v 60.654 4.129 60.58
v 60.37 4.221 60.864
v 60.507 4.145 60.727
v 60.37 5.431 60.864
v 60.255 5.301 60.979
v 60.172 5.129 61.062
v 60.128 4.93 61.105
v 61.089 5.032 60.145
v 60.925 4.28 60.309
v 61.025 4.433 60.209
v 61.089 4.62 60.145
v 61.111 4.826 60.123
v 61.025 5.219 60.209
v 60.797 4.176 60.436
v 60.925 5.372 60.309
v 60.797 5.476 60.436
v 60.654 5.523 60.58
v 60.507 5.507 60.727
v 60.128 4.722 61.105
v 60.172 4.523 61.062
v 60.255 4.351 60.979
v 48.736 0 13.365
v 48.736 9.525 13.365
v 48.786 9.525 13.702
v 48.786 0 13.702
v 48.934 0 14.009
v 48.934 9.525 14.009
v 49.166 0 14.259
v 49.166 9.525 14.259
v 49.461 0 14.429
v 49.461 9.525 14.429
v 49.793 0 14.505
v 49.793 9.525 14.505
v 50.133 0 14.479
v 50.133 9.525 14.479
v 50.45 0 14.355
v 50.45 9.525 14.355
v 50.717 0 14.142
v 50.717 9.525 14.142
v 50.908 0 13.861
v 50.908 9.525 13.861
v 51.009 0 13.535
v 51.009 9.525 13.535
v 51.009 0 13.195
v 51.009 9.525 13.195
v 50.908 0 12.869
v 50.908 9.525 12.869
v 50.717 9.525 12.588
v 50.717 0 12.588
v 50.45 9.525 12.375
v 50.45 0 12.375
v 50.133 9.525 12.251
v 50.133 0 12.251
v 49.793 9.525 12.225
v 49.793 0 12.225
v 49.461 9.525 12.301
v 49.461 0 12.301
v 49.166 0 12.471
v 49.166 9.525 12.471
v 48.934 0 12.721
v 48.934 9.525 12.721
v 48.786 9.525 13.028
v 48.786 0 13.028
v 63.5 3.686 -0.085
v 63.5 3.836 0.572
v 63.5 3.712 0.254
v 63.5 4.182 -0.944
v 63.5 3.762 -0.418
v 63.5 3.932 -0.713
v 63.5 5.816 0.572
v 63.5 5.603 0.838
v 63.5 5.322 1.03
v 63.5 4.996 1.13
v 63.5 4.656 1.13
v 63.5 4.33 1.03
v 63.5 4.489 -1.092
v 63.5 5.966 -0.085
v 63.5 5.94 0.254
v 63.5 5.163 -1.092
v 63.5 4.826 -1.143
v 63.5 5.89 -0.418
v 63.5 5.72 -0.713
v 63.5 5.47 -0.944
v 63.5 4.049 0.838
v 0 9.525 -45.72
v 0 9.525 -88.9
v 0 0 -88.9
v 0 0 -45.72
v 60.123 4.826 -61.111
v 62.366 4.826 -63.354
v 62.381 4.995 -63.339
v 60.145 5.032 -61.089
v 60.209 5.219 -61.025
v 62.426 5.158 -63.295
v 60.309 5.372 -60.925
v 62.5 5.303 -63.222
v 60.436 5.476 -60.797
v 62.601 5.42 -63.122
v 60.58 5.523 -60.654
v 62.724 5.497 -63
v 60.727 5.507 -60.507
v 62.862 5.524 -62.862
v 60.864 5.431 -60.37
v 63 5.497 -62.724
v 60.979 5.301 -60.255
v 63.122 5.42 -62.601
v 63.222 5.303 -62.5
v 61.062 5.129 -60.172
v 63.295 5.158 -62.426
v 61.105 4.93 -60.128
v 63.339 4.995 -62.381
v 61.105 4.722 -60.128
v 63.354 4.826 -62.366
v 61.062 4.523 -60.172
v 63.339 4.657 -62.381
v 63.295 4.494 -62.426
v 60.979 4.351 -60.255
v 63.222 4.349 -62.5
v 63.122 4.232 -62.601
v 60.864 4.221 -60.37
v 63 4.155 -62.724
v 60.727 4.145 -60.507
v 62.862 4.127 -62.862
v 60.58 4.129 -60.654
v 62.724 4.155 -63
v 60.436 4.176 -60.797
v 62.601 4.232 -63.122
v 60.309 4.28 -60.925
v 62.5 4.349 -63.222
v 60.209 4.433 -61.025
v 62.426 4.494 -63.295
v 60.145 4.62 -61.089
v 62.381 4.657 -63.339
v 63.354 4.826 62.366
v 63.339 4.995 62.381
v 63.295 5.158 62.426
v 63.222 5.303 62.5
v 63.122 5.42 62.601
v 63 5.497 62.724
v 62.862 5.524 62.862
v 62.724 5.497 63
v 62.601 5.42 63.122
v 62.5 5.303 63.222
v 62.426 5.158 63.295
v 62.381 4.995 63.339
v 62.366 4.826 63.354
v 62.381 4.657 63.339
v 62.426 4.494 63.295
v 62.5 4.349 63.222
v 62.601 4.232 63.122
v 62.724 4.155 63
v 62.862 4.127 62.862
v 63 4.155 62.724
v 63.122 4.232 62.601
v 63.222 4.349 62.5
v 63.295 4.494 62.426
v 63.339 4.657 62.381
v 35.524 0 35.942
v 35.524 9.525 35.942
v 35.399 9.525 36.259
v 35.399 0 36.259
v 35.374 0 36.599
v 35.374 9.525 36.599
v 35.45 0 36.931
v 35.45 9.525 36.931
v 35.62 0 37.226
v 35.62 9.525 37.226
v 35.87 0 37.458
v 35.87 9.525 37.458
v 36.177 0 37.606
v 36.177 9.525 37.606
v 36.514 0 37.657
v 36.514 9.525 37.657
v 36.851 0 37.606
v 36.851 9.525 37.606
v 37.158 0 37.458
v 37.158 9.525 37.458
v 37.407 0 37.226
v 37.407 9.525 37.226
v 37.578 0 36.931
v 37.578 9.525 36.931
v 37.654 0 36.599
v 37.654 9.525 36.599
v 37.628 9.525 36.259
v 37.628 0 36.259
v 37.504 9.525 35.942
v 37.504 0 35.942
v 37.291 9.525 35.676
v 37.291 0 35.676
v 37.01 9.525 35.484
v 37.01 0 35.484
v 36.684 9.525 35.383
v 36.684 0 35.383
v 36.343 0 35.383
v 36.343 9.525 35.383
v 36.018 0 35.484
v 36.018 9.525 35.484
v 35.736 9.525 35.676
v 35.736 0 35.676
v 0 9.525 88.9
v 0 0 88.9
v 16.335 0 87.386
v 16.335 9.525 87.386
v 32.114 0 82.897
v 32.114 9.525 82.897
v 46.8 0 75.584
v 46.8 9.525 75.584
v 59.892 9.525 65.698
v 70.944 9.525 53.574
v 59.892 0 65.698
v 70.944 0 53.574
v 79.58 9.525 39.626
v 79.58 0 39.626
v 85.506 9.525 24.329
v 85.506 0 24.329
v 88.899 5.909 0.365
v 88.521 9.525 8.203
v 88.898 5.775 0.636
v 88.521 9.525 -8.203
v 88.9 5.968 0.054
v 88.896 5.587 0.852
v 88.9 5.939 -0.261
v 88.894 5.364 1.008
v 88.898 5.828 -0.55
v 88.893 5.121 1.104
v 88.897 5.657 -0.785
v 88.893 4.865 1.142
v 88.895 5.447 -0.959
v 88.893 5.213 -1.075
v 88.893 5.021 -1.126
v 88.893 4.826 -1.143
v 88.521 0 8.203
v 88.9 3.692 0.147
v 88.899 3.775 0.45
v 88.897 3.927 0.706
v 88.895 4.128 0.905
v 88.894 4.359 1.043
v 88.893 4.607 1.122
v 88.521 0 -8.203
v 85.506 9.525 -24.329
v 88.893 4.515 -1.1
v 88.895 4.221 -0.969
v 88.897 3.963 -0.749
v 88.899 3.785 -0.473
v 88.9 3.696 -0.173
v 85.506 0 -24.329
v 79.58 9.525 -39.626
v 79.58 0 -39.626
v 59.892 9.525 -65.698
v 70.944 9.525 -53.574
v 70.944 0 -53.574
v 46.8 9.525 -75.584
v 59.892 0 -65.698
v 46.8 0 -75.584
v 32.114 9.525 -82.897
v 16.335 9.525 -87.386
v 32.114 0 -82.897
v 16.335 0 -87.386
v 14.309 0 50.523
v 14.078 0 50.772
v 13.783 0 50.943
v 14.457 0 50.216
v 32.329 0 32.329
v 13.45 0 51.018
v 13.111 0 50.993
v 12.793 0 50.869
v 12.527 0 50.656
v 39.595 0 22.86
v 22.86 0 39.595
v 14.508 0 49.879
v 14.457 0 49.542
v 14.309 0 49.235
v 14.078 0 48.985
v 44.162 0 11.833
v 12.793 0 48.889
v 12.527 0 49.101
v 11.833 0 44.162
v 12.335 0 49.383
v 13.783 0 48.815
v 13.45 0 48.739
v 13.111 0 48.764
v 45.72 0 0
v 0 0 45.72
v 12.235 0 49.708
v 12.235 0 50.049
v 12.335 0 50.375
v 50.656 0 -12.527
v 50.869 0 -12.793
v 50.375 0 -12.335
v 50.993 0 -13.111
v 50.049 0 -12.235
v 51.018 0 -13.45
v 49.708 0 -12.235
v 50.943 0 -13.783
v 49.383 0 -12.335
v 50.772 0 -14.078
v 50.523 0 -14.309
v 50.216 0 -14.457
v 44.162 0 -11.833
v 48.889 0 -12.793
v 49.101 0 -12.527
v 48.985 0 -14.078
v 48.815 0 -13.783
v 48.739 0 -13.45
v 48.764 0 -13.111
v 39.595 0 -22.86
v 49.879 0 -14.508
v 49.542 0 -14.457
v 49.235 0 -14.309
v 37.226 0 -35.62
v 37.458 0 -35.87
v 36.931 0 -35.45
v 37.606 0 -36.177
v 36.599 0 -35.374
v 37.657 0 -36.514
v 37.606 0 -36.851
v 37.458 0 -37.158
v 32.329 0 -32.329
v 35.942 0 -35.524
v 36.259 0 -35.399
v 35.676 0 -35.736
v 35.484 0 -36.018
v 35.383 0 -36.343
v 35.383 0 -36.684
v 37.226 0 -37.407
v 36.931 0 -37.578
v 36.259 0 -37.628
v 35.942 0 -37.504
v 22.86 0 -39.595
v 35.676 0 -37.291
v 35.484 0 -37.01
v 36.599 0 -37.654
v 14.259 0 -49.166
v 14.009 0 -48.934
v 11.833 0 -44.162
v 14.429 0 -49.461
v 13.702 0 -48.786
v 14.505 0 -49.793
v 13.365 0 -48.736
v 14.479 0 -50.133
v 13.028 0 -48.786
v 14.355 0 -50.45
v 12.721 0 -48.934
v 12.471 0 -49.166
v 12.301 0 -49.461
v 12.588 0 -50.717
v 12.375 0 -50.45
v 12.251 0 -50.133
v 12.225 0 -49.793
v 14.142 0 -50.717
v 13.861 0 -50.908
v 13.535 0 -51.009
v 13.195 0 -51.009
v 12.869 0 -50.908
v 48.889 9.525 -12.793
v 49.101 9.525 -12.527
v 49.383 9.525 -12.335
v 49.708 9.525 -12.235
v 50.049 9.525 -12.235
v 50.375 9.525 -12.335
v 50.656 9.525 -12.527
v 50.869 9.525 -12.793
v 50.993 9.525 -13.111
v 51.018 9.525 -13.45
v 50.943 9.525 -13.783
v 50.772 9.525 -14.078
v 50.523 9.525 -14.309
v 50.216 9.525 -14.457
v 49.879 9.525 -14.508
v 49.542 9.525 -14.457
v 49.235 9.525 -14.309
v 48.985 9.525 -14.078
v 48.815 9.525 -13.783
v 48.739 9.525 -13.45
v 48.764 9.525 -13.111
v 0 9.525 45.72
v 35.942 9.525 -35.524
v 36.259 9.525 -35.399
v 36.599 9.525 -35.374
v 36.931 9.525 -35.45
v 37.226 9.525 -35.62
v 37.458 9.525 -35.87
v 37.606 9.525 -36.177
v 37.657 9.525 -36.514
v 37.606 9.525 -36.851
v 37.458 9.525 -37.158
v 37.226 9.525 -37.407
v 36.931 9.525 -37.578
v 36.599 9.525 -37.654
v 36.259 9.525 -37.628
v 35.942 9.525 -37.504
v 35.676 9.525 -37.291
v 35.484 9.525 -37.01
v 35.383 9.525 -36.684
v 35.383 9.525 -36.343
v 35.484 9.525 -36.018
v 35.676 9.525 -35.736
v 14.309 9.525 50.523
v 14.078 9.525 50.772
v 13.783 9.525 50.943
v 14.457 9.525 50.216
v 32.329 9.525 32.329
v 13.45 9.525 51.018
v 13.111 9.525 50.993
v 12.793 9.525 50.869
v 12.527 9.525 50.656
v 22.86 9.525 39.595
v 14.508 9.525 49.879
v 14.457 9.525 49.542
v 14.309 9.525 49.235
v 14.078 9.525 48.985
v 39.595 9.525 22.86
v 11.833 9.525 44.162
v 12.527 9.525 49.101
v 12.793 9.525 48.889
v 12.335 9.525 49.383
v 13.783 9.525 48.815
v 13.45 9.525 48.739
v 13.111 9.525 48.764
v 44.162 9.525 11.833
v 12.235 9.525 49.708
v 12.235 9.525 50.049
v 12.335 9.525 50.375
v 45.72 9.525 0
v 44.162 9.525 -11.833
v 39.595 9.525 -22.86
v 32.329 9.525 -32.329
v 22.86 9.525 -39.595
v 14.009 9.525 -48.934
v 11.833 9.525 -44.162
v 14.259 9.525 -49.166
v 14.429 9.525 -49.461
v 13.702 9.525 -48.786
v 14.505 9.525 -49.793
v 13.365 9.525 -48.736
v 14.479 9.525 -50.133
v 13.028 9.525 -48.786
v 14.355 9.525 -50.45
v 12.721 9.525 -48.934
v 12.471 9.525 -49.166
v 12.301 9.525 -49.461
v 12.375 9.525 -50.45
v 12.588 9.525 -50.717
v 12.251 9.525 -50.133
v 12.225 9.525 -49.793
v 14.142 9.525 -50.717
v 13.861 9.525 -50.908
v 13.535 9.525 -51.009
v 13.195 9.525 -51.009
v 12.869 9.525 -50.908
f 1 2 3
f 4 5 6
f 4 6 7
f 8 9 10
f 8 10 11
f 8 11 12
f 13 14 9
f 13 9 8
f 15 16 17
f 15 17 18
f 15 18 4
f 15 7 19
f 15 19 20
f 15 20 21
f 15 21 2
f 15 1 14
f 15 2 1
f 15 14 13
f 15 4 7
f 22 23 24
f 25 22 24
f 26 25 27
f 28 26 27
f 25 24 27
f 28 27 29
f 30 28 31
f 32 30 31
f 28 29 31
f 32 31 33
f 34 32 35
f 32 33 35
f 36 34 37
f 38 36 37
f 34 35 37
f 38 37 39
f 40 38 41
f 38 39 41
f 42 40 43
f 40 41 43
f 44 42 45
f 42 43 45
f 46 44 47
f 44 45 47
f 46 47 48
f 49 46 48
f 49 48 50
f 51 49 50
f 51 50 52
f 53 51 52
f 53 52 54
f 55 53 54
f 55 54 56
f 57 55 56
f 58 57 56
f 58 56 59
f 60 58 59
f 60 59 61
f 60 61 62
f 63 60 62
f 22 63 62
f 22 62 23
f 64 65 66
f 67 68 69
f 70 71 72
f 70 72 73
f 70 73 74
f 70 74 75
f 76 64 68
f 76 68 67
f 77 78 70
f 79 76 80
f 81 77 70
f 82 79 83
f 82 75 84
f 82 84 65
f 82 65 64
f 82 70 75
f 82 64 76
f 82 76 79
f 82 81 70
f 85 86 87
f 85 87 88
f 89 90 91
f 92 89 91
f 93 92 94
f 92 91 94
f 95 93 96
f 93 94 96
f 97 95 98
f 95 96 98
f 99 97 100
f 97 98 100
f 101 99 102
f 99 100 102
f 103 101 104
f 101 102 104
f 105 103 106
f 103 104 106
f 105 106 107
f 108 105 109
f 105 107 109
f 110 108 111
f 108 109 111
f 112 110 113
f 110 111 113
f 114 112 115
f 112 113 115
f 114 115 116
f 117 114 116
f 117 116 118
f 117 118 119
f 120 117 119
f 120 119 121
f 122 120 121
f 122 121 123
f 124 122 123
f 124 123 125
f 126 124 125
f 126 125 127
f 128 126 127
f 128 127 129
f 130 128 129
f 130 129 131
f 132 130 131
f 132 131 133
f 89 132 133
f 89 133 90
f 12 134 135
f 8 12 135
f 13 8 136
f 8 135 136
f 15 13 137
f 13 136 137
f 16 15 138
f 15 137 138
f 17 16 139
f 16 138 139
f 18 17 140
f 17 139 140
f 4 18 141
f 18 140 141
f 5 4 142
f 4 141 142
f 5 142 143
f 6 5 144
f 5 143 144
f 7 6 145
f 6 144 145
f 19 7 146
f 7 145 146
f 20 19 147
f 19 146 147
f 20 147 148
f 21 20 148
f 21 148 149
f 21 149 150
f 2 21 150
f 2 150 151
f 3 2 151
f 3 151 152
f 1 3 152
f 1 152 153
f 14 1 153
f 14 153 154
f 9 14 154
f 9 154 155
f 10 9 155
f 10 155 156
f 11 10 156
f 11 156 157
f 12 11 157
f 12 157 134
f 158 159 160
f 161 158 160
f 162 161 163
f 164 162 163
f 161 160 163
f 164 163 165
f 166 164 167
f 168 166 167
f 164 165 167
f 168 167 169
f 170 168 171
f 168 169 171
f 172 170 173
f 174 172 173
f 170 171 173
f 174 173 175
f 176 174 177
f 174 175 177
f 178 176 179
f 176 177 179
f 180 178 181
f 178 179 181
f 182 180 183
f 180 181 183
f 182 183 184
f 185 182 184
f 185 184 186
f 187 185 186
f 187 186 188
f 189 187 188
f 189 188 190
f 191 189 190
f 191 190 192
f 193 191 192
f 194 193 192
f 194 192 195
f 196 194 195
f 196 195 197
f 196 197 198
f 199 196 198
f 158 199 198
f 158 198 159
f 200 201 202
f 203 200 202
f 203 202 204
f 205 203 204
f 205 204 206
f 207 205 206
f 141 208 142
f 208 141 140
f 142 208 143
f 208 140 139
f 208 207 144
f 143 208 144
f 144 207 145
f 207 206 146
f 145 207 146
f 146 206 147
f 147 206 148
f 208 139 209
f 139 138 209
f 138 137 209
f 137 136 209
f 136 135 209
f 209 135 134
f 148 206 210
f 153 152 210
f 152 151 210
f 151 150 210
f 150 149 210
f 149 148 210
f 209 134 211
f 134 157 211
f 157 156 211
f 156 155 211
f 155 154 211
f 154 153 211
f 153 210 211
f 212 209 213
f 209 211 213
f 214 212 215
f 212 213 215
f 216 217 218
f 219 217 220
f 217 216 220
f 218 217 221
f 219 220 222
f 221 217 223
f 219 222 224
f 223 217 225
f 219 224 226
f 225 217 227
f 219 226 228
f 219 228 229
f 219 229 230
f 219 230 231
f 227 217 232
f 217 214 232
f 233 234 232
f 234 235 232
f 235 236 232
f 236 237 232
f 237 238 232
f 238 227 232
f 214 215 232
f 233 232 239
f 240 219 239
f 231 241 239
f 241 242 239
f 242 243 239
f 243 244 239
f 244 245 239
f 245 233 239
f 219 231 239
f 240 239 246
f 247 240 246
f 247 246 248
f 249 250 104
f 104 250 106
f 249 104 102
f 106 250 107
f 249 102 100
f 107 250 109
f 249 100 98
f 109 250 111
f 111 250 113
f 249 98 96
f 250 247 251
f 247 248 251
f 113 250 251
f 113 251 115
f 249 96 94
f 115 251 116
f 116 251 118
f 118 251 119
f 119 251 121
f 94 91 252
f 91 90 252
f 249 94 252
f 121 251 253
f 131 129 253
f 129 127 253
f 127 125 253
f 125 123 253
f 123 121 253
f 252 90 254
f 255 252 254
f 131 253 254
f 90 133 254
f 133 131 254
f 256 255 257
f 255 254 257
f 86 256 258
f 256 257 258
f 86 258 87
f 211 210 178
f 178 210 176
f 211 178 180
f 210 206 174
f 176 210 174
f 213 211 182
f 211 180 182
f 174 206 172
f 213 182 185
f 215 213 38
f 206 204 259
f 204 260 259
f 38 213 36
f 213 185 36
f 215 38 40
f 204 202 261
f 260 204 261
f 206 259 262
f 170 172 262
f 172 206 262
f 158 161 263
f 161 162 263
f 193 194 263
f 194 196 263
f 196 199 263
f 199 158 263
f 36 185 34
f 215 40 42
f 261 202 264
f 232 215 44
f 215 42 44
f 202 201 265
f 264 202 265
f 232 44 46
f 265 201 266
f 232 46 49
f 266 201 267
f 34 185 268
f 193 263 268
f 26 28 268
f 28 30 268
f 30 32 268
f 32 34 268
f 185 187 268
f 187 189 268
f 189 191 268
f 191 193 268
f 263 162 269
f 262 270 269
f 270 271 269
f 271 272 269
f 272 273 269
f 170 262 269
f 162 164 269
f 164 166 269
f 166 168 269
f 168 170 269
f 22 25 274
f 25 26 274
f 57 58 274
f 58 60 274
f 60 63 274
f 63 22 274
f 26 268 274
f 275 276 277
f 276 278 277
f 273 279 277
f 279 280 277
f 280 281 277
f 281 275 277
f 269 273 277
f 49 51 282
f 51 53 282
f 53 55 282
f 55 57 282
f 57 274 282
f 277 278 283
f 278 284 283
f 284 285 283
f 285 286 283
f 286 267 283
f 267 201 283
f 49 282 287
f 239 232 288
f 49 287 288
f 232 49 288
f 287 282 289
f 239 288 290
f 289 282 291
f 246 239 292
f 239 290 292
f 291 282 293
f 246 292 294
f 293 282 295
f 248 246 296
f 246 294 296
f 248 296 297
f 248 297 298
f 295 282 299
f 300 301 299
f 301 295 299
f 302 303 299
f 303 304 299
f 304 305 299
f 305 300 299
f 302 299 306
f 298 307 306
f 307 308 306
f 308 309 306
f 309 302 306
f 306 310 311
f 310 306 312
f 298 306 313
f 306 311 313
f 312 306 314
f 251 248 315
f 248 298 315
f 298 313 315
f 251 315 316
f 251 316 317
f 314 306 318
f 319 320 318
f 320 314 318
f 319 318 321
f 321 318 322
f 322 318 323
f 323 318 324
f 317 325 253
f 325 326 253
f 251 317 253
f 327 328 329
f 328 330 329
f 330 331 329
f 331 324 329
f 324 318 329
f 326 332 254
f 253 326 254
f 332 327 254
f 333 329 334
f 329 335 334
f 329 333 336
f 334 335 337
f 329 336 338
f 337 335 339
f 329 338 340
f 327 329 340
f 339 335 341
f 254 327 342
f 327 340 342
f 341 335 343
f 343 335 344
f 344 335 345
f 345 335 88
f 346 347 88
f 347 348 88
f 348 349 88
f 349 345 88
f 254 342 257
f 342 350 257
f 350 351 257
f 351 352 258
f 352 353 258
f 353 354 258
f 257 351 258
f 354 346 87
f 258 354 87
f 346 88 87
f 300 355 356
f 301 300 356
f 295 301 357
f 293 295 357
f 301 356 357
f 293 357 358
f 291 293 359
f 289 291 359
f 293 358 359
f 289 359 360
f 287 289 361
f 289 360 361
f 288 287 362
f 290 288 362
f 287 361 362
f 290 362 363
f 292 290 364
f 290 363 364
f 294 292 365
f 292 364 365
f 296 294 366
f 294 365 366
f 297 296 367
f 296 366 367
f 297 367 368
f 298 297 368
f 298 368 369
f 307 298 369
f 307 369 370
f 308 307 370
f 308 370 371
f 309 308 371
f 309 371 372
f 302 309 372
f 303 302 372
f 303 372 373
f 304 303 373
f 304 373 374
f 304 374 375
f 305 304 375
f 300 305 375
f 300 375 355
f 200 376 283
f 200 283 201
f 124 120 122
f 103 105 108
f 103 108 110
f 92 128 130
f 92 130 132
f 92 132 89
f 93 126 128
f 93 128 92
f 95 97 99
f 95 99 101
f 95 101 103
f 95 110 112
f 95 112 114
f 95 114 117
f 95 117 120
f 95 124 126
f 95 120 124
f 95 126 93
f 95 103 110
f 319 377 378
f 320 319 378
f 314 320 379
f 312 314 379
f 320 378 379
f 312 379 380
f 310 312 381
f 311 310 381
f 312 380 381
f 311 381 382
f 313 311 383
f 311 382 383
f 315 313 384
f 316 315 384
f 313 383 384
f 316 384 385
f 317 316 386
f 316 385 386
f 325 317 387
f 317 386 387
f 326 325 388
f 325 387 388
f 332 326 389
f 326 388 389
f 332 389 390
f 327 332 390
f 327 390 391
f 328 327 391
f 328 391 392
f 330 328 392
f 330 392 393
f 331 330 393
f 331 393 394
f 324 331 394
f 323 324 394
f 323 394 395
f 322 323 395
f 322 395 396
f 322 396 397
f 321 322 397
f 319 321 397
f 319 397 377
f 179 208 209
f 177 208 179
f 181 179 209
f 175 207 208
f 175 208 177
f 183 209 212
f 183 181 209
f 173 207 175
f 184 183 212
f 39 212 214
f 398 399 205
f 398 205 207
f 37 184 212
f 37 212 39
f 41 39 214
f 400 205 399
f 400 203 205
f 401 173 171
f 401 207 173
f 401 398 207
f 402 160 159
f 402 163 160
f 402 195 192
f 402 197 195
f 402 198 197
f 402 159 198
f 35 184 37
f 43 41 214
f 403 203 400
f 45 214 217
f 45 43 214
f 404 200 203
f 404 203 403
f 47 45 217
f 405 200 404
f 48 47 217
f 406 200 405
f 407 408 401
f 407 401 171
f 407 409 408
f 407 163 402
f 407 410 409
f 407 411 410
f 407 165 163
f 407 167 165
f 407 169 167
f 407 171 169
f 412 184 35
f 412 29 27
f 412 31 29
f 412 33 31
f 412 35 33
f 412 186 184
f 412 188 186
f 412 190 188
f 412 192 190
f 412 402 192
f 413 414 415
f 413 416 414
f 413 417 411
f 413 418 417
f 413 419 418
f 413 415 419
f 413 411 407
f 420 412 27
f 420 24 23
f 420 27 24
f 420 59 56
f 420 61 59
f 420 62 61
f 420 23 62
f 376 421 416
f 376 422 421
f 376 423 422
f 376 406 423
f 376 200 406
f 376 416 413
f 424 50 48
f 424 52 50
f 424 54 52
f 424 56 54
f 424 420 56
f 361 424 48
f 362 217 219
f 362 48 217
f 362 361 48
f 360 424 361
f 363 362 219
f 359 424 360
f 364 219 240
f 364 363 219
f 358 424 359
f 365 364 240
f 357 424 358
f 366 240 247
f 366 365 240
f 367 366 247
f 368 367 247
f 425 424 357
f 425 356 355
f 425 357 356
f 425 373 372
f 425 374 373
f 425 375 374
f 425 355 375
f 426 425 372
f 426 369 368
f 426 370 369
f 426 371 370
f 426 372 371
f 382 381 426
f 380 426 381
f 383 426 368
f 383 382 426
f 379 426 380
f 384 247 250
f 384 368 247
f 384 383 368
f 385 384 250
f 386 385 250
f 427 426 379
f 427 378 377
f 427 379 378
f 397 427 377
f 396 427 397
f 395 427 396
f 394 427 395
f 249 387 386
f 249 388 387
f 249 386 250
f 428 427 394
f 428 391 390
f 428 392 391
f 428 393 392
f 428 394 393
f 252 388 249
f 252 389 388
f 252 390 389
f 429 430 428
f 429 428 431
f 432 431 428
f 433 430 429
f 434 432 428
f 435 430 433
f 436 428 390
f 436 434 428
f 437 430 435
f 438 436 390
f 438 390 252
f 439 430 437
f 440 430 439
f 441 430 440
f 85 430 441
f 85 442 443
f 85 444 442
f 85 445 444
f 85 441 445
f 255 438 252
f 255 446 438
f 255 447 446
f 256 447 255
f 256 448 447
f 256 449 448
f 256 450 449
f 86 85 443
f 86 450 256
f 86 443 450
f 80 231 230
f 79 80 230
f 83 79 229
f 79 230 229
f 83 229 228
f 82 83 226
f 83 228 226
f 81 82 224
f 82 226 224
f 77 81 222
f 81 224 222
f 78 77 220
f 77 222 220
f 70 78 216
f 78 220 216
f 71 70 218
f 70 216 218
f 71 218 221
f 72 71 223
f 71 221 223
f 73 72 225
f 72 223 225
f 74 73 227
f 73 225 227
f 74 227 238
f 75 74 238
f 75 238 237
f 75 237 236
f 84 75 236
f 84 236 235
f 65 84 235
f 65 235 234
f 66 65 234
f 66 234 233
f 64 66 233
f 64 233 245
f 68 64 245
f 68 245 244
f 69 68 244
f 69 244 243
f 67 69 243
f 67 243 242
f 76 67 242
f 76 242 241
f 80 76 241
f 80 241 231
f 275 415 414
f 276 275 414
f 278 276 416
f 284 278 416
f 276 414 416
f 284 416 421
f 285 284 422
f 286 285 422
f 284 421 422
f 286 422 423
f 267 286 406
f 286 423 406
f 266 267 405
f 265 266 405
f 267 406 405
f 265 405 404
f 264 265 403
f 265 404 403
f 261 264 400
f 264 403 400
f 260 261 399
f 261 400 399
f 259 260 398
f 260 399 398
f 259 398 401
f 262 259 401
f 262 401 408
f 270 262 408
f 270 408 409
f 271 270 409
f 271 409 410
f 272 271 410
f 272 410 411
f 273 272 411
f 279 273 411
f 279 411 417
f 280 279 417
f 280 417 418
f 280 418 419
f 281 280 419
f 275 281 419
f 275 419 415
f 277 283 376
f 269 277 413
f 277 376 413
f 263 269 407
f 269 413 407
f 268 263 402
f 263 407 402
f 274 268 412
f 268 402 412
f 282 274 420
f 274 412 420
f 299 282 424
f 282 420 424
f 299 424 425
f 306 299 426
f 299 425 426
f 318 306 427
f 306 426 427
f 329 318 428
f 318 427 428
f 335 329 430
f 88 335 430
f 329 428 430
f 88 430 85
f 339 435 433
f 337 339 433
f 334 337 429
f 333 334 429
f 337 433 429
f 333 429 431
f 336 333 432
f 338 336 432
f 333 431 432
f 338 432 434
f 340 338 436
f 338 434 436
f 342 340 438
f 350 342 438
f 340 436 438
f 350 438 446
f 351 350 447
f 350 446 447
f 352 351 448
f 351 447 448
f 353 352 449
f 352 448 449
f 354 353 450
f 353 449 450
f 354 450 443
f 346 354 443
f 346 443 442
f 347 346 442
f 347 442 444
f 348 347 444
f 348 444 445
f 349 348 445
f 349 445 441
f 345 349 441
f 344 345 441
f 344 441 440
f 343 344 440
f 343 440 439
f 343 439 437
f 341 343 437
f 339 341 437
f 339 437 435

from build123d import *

# Parameters (mm, degrees)
SKETCH1_R               = 88.9
BOSS_EXTRUDE1_DEPTH     = 9.525
SKETCH2_R               = 45.72
CUT_EXTRUDE1_DEPTH      = 12.7
SKETCH3_R               = 1.143
CUT_EXTRUDE2_DEPTH      = 12.7
CUT_EXTRUDE3_DEPTH      = 127.083883288
CUT_EXTRUDE3_DEPTH_BACK = 127.083883288
CIRPATTERN1_COUNT       = 12
SKETCH6_R               = 1.143
CUT_EXTRUDE4_DEPTH      = 25.4
SKETCH7_R               = 0.6985
CUT_EXTRUDE5_DEPTH      = 3.175
CIRPATTERN2_COUNT       = 4


with BuildPart() as part:
    # Sketch1 → Boss-Extrude1 (new body)
    with BuildSketch(Plane(origin=(0, 0, 0), x_dir=(1, 0, 0), z_dir=(0, 1, 0))):
        with Locations(Location((0, 0, 0), (0, 0, 90))):
            Circle(SKETCH1_R)
    extrude(amount=BOSS_EXTRUDE1_DEPTH)

    # Sketch2 → Cut-Extrude1 (cut)
    with BuildSketch(Plane(origin=(0, 9.525, 0), x_dir=(1, 0, 0), z_dir=(0, 1, 0))):
        with Locations(Location((0, 0, 0), (0, 0, 270))):
            Circle(SKETCH2_R)
    extrude(amount=-CUT_EXTRUDE1_DEPTH, mode=Mode.SUBTRACT)

    # Sketch3 → Cut-Extrude2 (cut)
    with BuildSketch(Plane(origin=(0, 9.525, 0), x_dir=(1, 0, 0), z_dir=(0, 1, 0))):
        with Locations(Location((13.364949615, 49.878671003, 0), (0, 0, 270))):
            Circle(SKETCH3_R)
    cut_extrude2 = extrude(amount=-CUT_EXTRUDE2_DEPTH, mode=Mode.SUBTRACT)

    # Sketch5 → Cut-Extrude3 (cut, two sides)
    with BuildSketch(Plane(origin=(0, 9.525, 0), x_dir=(1, 0, 0), z_dir=(0, 1, 0))) as cut_extrude3_sk:
        Polygon((0, 139.125590331), (0, -130.538836117), (-200.055019192, 4.293377107), align=None)
    extrude(amount=CUT_EXTRUDE3_DEPTH, mode=Mode.SUBTRACT)
    extrude(cut_extrude3_sk.sketch, amount=-CUT_EXTRUDE3_DEPTH_BACK, mode=Mode.SUBTRACT)

    # CirPattern1: Cut-Extrude2 ×12 about axis
    cirpattern1_axis = Axis((0, 9.525, 0), (0, 1, 0))
    for i in range(1, CIRPATTERN1_COUNT):
        add(cut_extrude2.rotate(cirpattern1_axis, i * 360 / CIRPATTERN1_COUNT), mode=Mode.SUBTRACT)

    # Sketch6 → Cut-Extrude4 (cut)
    with BuildSketch(Plane(origin=(88.9, 0, 0), x_dir=(0, 0, -1), z_dir=(1, 0, 0))):
        with Locations((0, 4.826)):
            Circle(SKETCH6_R)
    extrude(amount=-CUT_EXTRUDE4_DEPTH, mode=Mode.SUBTRACT)

    # Sketch7 → Cut-Extrude5 (cut)
    with BuildSketch(Plane(origin=(62.861792847, 0, 62.861792847), x_dir=(0, -1, 0), z_dir=(0.7071067811865464, 0, 0.7071067811865488))):
        with Locations(Location((-4.826, 0, 0), (0, 0, 90))):
            Circle(SKETCH7_R)
    cut_extrude5 = extrude(amount=-CUT_EXTRUDE5_DEPTH, mode=Mode.SUBTRACT)

    # CirPattern2: Cut-Extrude5 ×4 about axis
    cirpattern2_axis = Axis((0, 9.525, 0), (0, 1, 0))
    for i in range(1, CIRPATTERN2_COUNT):
        add(cut_extrude5.rotate(cirpattern2_axis, i * 360 / CIRPATTERN2_COUNT), mode=Mode.SUBTRACT)


solid = part.part
